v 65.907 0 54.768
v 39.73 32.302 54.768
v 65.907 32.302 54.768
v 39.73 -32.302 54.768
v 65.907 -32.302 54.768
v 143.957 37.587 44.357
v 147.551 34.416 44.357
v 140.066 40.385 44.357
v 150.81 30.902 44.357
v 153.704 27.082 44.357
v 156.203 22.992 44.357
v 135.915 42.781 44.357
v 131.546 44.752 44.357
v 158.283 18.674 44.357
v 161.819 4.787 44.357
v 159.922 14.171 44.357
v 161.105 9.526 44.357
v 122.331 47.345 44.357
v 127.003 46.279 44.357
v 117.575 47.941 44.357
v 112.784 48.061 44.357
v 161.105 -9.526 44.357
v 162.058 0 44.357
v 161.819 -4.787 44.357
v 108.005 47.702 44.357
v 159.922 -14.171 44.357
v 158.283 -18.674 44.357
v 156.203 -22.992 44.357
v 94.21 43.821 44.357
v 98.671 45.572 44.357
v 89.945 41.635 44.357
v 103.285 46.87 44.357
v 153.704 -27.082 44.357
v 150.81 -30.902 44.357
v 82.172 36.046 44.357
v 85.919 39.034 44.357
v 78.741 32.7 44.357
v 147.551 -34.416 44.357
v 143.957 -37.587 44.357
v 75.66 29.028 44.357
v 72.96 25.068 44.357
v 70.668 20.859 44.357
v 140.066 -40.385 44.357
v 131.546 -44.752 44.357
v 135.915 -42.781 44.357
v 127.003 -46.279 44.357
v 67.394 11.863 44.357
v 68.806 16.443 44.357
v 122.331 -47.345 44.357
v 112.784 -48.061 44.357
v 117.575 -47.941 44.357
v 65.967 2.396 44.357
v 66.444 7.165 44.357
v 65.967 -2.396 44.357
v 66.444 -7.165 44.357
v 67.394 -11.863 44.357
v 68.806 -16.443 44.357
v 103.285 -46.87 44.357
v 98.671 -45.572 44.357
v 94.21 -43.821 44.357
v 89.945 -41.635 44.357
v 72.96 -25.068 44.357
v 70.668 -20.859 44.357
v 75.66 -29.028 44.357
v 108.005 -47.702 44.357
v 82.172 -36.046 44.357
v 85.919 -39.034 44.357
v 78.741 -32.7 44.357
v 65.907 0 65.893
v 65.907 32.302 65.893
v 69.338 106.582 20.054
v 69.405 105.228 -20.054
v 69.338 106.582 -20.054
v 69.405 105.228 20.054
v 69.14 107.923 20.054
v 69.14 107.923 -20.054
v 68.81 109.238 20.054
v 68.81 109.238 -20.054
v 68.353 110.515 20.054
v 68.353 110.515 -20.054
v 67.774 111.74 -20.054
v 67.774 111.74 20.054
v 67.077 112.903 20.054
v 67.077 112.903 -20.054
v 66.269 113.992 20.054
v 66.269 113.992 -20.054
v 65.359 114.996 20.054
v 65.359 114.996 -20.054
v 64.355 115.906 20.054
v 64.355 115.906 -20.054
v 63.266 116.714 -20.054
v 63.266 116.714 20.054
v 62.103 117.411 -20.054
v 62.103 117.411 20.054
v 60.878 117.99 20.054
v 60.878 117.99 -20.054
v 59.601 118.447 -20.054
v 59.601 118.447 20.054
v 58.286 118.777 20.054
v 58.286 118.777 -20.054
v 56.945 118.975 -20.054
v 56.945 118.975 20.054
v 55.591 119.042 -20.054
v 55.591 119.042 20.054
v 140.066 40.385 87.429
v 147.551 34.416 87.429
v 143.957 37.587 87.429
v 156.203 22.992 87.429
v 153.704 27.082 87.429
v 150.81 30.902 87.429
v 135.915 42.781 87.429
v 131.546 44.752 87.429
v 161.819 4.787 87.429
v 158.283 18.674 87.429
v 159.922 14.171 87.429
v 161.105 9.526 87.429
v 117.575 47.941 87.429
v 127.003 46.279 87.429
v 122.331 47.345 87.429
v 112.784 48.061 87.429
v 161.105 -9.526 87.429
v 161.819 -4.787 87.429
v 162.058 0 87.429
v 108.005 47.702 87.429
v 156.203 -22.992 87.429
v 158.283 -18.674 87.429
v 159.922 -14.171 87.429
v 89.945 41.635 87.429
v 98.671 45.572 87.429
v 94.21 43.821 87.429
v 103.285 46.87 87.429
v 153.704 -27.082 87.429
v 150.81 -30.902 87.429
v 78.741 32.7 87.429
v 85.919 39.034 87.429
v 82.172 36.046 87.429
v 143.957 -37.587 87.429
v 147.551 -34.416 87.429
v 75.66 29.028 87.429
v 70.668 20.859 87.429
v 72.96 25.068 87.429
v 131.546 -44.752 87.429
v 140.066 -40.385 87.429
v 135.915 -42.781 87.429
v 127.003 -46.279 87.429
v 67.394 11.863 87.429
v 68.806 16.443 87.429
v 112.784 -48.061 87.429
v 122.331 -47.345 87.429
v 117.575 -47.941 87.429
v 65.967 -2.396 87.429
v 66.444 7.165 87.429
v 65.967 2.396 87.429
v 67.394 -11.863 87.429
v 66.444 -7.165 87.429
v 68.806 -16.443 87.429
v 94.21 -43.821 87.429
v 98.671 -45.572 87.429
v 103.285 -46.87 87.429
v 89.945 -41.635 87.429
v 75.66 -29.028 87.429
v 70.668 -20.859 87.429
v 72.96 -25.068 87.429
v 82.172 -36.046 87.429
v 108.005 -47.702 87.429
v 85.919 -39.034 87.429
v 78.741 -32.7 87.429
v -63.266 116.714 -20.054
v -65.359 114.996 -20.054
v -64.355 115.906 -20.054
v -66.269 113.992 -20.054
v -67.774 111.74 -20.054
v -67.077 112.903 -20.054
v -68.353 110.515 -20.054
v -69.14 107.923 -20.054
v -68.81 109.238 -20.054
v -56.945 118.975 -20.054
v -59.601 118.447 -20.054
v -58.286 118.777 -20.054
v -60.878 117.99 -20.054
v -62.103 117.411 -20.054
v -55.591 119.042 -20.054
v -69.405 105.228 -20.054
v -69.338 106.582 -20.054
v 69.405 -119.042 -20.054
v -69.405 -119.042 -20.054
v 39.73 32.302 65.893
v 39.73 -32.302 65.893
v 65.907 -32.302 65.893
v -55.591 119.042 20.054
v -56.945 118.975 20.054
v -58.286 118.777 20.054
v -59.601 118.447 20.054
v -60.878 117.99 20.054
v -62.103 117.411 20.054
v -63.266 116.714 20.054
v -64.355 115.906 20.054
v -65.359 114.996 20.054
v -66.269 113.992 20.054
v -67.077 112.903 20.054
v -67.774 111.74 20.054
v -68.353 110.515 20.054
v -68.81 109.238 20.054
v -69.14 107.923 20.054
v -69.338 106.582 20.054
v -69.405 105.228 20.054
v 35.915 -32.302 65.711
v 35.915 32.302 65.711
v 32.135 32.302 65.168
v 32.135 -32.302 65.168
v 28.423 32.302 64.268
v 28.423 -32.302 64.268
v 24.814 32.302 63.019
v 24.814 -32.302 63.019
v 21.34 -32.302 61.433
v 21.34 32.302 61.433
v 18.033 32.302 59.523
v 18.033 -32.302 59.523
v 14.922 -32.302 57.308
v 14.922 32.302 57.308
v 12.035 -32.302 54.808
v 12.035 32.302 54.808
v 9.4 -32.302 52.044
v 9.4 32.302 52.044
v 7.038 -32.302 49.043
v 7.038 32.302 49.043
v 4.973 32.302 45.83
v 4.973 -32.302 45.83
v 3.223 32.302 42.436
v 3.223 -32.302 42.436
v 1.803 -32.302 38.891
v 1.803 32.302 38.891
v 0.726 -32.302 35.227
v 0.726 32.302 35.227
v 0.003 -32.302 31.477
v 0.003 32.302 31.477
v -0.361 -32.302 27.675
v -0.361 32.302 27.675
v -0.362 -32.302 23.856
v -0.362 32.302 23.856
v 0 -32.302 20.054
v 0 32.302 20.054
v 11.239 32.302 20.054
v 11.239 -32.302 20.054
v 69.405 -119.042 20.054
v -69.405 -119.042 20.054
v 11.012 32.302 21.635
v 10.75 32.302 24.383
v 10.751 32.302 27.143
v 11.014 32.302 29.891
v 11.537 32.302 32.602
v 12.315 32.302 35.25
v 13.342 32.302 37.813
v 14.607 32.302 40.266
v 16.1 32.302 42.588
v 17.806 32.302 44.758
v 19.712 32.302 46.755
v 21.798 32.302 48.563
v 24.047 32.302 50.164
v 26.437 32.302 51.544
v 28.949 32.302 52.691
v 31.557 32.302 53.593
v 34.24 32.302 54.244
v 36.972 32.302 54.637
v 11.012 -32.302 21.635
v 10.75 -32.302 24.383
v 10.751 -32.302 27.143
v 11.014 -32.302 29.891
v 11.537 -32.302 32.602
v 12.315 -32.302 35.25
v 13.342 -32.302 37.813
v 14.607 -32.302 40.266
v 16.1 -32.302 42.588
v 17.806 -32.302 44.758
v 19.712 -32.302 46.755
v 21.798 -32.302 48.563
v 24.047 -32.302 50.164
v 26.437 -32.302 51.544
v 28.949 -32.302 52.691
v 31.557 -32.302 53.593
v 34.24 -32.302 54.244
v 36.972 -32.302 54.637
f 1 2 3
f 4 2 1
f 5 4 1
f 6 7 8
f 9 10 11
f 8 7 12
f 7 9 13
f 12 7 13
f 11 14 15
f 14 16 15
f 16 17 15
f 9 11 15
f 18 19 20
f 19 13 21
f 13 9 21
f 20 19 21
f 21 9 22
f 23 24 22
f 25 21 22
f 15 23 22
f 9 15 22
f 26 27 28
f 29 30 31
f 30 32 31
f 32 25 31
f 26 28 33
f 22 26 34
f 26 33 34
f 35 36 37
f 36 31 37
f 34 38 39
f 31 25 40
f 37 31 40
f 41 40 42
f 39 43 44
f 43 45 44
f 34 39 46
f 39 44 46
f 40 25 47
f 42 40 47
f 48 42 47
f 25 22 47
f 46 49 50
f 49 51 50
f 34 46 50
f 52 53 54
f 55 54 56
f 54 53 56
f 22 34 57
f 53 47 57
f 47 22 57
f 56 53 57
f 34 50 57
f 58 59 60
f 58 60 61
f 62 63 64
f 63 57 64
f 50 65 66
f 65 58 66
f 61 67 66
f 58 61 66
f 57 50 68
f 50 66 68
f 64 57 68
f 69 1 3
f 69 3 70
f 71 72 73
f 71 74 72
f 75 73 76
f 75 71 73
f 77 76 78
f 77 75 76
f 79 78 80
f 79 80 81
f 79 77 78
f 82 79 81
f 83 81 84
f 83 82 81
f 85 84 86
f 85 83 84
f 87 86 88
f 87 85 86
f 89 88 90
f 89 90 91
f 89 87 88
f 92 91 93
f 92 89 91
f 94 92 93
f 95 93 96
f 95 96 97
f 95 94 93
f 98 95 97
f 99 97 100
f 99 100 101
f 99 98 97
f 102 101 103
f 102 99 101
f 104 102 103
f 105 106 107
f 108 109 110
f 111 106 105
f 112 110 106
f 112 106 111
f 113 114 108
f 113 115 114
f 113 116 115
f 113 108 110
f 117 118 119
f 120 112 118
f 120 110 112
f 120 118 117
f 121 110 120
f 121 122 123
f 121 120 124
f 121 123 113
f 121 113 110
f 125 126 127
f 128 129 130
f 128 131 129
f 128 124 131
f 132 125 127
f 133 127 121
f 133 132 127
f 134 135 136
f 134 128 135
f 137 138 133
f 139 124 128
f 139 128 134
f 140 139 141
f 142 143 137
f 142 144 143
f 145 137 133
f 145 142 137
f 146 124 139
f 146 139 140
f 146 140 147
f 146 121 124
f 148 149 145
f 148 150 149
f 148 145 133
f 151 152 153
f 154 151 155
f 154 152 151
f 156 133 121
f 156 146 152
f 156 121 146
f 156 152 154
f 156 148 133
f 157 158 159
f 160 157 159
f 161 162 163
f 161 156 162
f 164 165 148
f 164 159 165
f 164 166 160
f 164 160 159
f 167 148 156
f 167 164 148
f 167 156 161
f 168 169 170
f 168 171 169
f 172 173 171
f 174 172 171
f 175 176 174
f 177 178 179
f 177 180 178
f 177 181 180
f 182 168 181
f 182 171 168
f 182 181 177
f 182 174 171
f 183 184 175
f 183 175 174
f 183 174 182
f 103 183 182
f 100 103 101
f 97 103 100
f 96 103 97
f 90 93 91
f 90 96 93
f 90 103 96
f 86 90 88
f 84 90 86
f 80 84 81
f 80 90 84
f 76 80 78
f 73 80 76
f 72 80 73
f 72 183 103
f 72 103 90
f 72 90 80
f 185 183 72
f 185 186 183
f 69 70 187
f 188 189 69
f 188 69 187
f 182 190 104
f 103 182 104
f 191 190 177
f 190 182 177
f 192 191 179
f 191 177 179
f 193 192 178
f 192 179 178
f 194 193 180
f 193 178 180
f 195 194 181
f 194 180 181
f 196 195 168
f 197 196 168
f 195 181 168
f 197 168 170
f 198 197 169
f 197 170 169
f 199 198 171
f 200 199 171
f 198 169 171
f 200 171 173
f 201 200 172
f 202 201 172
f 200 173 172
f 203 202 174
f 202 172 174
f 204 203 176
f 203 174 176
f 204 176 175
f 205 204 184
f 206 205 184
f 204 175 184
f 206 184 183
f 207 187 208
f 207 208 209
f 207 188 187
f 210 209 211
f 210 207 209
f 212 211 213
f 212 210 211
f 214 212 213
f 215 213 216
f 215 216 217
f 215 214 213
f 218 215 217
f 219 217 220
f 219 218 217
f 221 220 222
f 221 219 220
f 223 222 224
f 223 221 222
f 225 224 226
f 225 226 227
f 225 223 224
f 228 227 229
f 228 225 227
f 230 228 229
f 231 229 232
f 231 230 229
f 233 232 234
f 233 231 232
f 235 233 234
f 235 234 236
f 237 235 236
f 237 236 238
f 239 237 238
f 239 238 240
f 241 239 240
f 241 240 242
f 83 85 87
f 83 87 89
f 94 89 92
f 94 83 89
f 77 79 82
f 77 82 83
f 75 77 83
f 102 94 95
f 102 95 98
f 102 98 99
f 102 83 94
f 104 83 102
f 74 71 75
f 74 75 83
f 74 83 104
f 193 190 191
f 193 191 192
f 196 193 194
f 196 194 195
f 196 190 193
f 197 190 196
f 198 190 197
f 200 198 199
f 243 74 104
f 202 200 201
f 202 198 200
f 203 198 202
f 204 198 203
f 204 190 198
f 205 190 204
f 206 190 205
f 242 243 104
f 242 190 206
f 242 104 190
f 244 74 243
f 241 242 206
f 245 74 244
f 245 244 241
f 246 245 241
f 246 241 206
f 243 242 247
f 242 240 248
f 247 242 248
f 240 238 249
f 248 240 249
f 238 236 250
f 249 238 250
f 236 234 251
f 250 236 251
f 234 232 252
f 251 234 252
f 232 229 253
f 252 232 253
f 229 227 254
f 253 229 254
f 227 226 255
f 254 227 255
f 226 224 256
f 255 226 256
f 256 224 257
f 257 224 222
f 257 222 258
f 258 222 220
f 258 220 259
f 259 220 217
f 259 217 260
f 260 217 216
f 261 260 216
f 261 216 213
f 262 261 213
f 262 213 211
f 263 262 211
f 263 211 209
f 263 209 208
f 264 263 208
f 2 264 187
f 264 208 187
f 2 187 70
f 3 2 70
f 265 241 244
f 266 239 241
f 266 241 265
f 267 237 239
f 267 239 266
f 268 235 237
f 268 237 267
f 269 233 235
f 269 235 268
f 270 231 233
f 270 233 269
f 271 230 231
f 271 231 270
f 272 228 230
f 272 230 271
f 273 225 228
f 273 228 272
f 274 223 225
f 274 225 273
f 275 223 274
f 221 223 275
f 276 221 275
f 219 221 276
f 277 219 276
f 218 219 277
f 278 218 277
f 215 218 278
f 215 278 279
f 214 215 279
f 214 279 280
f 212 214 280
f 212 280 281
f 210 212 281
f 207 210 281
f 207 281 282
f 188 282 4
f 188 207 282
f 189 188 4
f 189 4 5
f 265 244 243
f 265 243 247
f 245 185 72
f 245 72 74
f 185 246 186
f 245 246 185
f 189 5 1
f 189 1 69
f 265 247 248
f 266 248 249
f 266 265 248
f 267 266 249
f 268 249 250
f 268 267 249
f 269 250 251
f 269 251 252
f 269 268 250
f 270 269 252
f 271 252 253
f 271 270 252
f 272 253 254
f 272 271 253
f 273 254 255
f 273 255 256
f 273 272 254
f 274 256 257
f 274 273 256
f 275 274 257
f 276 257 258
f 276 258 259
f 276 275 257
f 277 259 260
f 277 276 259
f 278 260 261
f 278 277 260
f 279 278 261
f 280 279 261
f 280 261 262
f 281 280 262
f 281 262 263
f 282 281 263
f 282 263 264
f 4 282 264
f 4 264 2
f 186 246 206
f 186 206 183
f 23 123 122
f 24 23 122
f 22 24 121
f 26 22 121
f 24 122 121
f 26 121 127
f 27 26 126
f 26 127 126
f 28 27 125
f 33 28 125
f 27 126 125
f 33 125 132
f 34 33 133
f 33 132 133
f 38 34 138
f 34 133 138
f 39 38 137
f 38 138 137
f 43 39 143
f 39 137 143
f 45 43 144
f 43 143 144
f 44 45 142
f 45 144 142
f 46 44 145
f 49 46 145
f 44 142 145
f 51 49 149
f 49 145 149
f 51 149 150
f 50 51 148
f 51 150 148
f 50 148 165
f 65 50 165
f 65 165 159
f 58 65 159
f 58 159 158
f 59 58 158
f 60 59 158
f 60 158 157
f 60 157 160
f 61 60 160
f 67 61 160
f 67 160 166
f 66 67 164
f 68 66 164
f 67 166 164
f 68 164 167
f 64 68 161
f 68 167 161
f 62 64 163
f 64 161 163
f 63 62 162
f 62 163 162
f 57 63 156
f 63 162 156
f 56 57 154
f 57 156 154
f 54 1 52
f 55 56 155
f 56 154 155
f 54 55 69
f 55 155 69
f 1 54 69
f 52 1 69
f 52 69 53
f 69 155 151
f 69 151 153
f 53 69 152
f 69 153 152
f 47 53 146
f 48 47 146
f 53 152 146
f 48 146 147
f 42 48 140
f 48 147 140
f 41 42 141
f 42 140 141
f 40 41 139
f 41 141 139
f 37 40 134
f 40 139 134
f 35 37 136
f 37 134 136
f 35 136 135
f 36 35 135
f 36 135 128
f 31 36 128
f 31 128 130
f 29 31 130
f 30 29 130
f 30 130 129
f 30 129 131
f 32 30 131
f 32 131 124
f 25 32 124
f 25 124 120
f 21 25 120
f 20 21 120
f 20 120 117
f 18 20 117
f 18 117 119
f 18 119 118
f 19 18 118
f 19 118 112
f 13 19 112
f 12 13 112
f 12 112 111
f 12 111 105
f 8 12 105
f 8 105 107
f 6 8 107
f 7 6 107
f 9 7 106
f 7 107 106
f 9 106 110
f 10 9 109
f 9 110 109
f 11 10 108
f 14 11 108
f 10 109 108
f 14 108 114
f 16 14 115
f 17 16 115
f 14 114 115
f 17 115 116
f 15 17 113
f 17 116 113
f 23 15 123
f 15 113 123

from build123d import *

# Parameters (mm, degrees)
F1_DEPTH = 119.0419690683
F2_DEPTH = 32.3018105701
F0_W     = 48.0754971504
F0_H     = 43.07214856
F4_R     = 13.8136399245


with BuildPart() as f1:
    # F0 (on Front) → F1 (new body, symmetric)
    with BuildSketch(Plane.XZ):
        Polygon((69.4049298763, -20.0544297695), (69.4049298763, 20.0544297695), (11.2389746131, 20.0544297695), (0, 20.0544297695), (-69.4049298763, 20.0544297695), (-69.4049298763, -20.0544297695), align=None)
    extrude(amount=F1_DEPTH, both=True)

    # F0 (on Front) → F2 (join, symmetric)
    with BuildSketch(Plane.XZ):
        with BuildLine():
            Line((0, 20.0544297695), (11.2389746131, 20.0544297695))
            Line((11.2389746131, 20.0544297695), (11.0121456355, 21.6348960729))
            ThreePointArc((11.0121456355, 21.6348960729), (17.806417225, 44.7578416287), (39.7296100855, 54.7681539319))
            Line((39.7296100855, 54.7681539319), (65.9070312977, 54.7681539319))
            Line((65.9070312977, 54.7681539319), (65.9070312977, 65.8931359649))
            Line((65.9070312977, 65.8931359649), (39.7296100855, 65.8931359649))
            ThreePointArc((39.7296100855, 65.8931359649), (9.3996376852, 52.0442181631), (0, 20.0544297695))
        make_face()
    extrude(amount=F2_DEPTH, both=True)

    # F0 (on Front) → F3 (revolve)
    with BuildSketch(Plane.XZ):
        with Locations((138.0202770233, 65.8931359649)):
            Rectangle(F0_W, F0_H)
    revolve(axis=Axis((113.9825284481, 0, 65.8931359649), (0, 0, -1)))

    # F4
    f4_edges = [f1.edges().sort_by_distance(p)[0] for p in [
        (-69.40493, 119.041969, 0),
        (69.40493, 119.041969, 0),
    ]]
    fillet(f4_edges, radius=F4_R)


solid = f1.part
